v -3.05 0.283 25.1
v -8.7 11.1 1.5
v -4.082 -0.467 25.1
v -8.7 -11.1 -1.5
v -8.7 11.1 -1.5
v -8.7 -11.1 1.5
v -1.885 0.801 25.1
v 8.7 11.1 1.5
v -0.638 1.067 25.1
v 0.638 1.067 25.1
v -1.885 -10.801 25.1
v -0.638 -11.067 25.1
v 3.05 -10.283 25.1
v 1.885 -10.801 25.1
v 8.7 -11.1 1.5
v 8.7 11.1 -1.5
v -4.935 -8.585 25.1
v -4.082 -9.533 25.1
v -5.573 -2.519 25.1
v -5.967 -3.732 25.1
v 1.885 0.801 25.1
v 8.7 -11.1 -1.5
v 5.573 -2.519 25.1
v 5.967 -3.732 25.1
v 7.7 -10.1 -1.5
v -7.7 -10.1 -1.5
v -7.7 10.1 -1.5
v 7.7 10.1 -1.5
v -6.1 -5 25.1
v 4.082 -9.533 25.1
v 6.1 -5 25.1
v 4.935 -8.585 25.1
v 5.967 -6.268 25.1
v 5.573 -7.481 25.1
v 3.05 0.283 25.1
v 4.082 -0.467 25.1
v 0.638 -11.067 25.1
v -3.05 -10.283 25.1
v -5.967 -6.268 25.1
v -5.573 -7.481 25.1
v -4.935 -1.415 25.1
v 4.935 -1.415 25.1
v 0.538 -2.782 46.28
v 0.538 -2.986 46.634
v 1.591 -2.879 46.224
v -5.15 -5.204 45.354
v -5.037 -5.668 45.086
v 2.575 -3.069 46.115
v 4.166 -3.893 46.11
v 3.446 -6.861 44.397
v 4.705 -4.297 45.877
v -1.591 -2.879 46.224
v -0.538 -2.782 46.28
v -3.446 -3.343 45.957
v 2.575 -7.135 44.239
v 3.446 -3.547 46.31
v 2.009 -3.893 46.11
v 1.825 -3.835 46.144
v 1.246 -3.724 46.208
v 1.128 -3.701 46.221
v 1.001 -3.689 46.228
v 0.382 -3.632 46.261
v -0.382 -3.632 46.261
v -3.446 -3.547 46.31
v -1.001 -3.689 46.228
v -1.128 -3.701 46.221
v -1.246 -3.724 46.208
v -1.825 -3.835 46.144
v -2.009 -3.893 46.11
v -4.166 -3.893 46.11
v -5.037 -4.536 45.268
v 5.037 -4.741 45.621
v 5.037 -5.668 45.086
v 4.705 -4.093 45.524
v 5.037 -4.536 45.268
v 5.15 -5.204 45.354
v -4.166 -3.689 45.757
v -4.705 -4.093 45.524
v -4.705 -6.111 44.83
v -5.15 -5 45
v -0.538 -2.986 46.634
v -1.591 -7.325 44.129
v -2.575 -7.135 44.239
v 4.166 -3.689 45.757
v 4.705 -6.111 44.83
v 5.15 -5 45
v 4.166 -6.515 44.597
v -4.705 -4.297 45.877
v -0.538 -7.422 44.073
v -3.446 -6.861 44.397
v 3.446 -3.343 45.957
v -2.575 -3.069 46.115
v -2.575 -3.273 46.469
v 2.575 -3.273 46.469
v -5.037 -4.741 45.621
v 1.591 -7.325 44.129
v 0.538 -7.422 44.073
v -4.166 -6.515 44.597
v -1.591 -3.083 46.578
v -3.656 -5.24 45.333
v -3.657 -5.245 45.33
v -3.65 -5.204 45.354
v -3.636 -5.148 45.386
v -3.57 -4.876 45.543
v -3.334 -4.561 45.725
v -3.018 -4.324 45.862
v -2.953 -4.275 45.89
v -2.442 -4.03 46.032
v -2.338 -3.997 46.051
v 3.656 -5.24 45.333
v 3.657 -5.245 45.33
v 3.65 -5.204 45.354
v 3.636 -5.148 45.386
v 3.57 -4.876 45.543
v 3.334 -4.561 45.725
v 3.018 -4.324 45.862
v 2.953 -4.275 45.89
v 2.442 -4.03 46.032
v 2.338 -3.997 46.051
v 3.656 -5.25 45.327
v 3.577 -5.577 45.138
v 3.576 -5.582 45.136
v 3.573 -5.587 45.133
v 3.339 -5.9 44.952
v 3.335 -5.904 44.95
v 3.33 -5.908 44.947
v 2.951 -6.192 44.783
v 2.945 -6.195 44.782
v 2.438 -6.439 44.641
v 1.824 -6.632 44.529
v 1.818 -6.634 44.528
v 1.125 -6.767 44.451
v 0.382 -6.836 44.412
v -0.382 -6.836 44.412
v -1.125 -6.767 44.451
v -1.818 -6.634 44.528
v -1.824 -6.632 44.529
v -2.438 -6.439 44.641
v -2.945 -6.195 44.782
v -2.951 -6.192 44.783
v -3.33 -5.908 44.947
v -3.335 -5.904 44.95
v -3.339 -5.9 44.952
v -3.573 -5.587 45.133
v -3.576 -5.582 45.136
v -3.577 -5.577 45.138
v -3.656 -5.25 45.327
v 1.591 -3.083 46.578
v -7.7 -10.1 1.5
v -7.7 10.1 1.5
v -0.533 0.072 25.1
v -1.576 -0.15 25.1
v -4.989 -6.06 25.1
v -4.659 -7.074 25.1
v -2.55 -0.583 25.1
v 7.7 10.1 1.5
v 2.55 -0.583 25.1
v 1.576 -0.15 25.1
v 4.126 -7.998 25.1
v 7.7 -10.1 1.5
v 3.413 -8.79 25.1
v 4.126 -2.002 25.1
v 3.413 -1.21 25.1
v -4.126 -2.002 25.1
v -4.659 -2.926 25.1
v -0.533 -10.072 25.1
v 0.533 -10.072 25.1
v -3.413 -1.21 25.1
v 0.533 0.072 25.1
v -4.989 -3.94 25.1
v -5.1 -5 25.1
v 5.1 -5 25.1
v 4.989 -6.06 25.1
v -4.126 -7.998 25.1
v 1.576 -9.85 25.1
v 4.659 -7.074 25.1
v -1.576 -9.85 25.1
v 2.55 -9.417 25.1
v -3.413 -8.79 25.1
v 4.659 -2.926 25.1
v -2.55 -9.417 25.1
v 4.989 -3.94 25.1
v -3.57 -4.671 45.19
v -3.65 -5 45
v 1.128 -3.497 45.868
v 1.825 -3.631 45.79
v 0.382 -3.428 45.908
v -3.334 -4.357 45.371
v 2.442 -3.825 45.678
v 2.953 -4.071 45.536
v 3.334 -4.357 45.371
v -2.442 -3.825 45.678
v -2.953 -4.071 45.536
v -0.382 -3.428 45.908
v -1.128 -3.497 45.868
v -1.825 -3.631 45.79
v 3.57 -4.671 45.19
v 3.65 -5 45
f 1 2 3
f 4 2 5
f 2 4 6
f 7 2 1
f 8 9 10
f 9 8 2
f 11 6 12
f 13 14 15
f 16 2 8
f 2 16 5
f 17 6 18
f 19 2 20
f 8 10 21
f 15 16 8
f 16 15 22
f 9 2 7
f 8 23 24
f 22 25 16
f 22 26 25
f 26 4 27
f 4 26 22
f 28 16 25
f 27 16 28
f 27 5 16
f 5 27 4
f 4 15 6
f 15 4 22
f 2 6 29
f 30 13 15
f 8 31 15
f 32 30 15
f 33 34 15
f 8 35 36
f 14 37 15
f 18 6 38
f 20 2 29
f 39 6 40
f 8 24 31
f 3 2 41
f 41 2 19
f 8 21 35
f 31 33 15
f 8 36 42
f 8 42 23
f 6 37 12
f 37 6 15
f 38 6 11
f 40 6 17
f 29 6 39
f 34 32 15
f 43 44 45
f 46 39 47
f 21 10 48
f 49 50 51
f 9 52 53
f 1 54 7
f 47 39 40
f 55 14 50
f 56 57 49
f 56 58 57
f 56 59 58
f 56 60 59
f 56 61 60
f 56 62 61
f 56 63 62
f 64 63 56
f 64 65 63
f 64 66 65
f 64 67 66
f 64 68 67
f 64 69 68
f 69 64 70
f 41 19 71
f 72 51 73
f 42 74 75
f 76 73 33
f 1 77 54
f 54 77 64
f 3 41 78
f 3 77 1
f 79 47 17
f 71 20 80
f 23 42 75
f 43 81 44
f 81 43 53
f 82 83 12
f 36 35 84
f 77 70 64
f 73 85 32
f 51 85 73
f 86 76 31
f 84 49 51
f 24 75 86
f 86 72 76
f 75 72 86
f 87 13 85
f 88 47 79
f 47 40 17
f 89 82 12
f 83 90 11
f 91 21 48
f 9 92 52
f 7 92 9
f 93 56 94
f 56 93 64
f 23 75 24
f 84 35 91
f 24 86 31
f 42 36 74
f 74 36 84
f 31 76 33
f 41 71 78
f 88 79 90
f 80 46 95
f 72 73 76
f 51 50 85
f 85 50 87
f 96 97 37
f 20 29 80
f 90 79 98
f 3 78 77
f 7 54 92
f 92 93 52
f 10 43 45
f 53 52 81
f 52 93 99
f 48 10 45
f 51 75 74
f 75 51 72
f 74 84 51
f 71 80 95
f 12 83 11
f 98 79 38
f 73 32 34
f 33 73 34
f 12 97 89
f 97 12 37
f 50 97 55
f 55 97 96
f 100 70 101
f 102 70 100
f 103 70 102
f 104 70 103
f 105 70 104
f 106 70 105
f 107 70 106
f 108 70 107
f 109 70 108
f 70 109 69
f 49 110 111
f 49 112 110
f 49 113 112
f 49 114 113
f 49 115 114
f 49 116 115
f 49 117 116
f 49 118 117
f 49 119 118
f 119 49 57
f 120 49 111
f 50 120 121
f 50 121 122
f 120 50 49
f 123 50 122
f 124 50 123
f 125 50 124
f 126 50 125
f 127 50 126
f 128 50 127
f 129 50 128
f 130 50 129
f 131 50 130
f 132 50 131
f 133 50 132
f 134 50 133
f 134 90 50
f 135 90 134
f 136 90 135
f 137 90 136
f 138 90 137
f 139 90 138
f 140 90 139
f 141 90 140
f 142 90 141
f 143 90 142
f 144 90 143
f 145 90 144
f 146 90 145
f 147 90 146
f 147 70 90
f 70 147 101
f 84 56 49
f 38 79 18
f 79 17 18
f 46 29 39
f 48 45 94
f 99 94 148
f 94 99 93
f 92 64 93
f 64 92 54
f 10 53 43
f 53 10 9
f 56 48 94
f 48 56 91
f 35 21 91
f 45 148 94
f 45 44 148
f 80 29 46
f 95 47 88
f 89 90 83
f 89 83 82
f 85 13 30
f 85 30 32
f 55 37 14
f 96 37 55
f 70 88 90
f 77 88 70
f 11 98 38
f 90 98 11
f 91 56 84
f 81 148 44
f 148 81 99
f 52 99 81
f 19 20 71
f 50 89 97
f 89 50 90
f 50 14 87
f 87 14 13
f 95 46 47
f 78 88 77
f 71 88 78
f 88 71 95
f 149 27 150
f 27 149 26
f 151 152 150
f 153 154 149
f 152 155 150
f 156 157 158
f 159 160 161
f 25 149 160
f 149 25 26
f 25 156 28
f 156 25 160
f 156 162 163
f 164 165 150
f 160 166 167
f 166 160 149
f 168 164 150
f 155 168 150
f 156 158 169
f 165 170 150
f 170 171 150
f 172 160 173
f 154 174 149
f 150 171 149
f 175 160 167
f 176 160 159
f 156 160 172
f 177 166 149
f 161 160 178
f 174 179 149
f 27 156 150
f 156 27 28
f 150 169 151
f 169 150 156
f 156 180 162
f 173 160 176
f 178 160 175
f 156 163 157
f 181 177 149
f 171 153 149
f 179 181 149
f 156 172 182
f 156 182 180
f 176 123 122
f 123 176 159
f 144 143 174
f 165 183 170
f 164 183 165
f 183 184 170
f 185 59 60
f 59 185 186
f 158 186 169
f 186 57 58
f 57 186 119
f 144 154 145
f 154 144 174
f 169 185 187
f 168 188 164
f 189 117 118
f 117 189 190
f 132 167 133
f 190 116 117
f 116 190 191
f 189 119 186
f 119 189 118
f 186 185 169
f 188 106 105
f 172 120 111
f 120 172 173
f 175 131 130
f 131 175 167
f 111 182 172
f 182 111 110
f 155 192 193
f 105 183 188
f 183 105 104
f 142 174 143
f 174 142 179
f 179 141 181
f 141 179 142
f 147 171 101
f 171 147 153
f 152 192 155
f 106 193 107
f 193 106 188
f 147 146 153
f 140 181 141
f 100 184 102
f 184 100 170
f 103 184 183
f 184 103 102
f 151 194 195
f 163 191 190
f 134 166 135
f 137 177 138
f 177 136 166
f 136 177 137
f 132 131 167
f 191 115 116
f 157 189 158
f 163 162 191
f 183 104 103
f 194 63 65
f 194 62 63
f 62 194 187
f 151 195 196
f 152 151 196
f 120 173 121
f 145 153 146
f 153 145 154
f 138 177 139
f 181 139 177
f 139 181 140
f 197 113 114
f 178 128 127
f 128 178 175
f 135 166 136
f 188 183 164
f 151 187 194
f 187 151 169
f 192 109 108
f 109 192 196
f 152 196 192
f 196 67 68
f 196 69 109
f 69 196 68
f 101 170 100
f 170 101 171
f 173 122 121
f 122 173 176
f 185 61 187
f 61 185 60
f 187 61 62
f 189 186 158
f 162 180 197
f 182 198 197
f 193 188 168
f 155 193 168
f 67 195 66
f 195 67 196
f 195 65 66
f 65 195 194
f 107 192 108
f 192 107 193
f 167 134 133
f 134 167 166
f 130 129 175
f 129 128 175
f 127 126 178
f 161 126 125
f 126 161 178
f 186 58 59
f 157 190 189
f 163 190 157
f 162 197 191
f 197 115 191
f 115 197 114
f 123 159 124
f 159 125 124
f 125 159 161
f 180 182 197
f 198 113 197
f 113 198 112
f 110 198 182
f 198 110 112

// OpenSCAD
// FanDuct.scad
//https://www.thingiverse.com/thing:387301

$fs=0.1;
module FanDuct() {
	tol=0.10;
	wallThickness=1;//0.8;

	module Shape(dia) {
		color("blue") hull() {
			cube([15.2+dia*2,20+dia*2,3],center=true);
			translate([0,-5,25])cylinder(h=0.1,d=10+dia*2);
		}
		color("red") hull() {
			translate([0,-5,25])cylinder(h=0.1,d=10+dia*2);
			translate([0,-5,45])rotate([30,0,0])scale([1.0,0.5,1])cylinder(h=0.5-dia/12,d=7+dia*3);
		}
	}

	difference() {
		Shape(dia=wallThickness+tol);
		Shape(dia=tol);
	}
}


FanDuct();
